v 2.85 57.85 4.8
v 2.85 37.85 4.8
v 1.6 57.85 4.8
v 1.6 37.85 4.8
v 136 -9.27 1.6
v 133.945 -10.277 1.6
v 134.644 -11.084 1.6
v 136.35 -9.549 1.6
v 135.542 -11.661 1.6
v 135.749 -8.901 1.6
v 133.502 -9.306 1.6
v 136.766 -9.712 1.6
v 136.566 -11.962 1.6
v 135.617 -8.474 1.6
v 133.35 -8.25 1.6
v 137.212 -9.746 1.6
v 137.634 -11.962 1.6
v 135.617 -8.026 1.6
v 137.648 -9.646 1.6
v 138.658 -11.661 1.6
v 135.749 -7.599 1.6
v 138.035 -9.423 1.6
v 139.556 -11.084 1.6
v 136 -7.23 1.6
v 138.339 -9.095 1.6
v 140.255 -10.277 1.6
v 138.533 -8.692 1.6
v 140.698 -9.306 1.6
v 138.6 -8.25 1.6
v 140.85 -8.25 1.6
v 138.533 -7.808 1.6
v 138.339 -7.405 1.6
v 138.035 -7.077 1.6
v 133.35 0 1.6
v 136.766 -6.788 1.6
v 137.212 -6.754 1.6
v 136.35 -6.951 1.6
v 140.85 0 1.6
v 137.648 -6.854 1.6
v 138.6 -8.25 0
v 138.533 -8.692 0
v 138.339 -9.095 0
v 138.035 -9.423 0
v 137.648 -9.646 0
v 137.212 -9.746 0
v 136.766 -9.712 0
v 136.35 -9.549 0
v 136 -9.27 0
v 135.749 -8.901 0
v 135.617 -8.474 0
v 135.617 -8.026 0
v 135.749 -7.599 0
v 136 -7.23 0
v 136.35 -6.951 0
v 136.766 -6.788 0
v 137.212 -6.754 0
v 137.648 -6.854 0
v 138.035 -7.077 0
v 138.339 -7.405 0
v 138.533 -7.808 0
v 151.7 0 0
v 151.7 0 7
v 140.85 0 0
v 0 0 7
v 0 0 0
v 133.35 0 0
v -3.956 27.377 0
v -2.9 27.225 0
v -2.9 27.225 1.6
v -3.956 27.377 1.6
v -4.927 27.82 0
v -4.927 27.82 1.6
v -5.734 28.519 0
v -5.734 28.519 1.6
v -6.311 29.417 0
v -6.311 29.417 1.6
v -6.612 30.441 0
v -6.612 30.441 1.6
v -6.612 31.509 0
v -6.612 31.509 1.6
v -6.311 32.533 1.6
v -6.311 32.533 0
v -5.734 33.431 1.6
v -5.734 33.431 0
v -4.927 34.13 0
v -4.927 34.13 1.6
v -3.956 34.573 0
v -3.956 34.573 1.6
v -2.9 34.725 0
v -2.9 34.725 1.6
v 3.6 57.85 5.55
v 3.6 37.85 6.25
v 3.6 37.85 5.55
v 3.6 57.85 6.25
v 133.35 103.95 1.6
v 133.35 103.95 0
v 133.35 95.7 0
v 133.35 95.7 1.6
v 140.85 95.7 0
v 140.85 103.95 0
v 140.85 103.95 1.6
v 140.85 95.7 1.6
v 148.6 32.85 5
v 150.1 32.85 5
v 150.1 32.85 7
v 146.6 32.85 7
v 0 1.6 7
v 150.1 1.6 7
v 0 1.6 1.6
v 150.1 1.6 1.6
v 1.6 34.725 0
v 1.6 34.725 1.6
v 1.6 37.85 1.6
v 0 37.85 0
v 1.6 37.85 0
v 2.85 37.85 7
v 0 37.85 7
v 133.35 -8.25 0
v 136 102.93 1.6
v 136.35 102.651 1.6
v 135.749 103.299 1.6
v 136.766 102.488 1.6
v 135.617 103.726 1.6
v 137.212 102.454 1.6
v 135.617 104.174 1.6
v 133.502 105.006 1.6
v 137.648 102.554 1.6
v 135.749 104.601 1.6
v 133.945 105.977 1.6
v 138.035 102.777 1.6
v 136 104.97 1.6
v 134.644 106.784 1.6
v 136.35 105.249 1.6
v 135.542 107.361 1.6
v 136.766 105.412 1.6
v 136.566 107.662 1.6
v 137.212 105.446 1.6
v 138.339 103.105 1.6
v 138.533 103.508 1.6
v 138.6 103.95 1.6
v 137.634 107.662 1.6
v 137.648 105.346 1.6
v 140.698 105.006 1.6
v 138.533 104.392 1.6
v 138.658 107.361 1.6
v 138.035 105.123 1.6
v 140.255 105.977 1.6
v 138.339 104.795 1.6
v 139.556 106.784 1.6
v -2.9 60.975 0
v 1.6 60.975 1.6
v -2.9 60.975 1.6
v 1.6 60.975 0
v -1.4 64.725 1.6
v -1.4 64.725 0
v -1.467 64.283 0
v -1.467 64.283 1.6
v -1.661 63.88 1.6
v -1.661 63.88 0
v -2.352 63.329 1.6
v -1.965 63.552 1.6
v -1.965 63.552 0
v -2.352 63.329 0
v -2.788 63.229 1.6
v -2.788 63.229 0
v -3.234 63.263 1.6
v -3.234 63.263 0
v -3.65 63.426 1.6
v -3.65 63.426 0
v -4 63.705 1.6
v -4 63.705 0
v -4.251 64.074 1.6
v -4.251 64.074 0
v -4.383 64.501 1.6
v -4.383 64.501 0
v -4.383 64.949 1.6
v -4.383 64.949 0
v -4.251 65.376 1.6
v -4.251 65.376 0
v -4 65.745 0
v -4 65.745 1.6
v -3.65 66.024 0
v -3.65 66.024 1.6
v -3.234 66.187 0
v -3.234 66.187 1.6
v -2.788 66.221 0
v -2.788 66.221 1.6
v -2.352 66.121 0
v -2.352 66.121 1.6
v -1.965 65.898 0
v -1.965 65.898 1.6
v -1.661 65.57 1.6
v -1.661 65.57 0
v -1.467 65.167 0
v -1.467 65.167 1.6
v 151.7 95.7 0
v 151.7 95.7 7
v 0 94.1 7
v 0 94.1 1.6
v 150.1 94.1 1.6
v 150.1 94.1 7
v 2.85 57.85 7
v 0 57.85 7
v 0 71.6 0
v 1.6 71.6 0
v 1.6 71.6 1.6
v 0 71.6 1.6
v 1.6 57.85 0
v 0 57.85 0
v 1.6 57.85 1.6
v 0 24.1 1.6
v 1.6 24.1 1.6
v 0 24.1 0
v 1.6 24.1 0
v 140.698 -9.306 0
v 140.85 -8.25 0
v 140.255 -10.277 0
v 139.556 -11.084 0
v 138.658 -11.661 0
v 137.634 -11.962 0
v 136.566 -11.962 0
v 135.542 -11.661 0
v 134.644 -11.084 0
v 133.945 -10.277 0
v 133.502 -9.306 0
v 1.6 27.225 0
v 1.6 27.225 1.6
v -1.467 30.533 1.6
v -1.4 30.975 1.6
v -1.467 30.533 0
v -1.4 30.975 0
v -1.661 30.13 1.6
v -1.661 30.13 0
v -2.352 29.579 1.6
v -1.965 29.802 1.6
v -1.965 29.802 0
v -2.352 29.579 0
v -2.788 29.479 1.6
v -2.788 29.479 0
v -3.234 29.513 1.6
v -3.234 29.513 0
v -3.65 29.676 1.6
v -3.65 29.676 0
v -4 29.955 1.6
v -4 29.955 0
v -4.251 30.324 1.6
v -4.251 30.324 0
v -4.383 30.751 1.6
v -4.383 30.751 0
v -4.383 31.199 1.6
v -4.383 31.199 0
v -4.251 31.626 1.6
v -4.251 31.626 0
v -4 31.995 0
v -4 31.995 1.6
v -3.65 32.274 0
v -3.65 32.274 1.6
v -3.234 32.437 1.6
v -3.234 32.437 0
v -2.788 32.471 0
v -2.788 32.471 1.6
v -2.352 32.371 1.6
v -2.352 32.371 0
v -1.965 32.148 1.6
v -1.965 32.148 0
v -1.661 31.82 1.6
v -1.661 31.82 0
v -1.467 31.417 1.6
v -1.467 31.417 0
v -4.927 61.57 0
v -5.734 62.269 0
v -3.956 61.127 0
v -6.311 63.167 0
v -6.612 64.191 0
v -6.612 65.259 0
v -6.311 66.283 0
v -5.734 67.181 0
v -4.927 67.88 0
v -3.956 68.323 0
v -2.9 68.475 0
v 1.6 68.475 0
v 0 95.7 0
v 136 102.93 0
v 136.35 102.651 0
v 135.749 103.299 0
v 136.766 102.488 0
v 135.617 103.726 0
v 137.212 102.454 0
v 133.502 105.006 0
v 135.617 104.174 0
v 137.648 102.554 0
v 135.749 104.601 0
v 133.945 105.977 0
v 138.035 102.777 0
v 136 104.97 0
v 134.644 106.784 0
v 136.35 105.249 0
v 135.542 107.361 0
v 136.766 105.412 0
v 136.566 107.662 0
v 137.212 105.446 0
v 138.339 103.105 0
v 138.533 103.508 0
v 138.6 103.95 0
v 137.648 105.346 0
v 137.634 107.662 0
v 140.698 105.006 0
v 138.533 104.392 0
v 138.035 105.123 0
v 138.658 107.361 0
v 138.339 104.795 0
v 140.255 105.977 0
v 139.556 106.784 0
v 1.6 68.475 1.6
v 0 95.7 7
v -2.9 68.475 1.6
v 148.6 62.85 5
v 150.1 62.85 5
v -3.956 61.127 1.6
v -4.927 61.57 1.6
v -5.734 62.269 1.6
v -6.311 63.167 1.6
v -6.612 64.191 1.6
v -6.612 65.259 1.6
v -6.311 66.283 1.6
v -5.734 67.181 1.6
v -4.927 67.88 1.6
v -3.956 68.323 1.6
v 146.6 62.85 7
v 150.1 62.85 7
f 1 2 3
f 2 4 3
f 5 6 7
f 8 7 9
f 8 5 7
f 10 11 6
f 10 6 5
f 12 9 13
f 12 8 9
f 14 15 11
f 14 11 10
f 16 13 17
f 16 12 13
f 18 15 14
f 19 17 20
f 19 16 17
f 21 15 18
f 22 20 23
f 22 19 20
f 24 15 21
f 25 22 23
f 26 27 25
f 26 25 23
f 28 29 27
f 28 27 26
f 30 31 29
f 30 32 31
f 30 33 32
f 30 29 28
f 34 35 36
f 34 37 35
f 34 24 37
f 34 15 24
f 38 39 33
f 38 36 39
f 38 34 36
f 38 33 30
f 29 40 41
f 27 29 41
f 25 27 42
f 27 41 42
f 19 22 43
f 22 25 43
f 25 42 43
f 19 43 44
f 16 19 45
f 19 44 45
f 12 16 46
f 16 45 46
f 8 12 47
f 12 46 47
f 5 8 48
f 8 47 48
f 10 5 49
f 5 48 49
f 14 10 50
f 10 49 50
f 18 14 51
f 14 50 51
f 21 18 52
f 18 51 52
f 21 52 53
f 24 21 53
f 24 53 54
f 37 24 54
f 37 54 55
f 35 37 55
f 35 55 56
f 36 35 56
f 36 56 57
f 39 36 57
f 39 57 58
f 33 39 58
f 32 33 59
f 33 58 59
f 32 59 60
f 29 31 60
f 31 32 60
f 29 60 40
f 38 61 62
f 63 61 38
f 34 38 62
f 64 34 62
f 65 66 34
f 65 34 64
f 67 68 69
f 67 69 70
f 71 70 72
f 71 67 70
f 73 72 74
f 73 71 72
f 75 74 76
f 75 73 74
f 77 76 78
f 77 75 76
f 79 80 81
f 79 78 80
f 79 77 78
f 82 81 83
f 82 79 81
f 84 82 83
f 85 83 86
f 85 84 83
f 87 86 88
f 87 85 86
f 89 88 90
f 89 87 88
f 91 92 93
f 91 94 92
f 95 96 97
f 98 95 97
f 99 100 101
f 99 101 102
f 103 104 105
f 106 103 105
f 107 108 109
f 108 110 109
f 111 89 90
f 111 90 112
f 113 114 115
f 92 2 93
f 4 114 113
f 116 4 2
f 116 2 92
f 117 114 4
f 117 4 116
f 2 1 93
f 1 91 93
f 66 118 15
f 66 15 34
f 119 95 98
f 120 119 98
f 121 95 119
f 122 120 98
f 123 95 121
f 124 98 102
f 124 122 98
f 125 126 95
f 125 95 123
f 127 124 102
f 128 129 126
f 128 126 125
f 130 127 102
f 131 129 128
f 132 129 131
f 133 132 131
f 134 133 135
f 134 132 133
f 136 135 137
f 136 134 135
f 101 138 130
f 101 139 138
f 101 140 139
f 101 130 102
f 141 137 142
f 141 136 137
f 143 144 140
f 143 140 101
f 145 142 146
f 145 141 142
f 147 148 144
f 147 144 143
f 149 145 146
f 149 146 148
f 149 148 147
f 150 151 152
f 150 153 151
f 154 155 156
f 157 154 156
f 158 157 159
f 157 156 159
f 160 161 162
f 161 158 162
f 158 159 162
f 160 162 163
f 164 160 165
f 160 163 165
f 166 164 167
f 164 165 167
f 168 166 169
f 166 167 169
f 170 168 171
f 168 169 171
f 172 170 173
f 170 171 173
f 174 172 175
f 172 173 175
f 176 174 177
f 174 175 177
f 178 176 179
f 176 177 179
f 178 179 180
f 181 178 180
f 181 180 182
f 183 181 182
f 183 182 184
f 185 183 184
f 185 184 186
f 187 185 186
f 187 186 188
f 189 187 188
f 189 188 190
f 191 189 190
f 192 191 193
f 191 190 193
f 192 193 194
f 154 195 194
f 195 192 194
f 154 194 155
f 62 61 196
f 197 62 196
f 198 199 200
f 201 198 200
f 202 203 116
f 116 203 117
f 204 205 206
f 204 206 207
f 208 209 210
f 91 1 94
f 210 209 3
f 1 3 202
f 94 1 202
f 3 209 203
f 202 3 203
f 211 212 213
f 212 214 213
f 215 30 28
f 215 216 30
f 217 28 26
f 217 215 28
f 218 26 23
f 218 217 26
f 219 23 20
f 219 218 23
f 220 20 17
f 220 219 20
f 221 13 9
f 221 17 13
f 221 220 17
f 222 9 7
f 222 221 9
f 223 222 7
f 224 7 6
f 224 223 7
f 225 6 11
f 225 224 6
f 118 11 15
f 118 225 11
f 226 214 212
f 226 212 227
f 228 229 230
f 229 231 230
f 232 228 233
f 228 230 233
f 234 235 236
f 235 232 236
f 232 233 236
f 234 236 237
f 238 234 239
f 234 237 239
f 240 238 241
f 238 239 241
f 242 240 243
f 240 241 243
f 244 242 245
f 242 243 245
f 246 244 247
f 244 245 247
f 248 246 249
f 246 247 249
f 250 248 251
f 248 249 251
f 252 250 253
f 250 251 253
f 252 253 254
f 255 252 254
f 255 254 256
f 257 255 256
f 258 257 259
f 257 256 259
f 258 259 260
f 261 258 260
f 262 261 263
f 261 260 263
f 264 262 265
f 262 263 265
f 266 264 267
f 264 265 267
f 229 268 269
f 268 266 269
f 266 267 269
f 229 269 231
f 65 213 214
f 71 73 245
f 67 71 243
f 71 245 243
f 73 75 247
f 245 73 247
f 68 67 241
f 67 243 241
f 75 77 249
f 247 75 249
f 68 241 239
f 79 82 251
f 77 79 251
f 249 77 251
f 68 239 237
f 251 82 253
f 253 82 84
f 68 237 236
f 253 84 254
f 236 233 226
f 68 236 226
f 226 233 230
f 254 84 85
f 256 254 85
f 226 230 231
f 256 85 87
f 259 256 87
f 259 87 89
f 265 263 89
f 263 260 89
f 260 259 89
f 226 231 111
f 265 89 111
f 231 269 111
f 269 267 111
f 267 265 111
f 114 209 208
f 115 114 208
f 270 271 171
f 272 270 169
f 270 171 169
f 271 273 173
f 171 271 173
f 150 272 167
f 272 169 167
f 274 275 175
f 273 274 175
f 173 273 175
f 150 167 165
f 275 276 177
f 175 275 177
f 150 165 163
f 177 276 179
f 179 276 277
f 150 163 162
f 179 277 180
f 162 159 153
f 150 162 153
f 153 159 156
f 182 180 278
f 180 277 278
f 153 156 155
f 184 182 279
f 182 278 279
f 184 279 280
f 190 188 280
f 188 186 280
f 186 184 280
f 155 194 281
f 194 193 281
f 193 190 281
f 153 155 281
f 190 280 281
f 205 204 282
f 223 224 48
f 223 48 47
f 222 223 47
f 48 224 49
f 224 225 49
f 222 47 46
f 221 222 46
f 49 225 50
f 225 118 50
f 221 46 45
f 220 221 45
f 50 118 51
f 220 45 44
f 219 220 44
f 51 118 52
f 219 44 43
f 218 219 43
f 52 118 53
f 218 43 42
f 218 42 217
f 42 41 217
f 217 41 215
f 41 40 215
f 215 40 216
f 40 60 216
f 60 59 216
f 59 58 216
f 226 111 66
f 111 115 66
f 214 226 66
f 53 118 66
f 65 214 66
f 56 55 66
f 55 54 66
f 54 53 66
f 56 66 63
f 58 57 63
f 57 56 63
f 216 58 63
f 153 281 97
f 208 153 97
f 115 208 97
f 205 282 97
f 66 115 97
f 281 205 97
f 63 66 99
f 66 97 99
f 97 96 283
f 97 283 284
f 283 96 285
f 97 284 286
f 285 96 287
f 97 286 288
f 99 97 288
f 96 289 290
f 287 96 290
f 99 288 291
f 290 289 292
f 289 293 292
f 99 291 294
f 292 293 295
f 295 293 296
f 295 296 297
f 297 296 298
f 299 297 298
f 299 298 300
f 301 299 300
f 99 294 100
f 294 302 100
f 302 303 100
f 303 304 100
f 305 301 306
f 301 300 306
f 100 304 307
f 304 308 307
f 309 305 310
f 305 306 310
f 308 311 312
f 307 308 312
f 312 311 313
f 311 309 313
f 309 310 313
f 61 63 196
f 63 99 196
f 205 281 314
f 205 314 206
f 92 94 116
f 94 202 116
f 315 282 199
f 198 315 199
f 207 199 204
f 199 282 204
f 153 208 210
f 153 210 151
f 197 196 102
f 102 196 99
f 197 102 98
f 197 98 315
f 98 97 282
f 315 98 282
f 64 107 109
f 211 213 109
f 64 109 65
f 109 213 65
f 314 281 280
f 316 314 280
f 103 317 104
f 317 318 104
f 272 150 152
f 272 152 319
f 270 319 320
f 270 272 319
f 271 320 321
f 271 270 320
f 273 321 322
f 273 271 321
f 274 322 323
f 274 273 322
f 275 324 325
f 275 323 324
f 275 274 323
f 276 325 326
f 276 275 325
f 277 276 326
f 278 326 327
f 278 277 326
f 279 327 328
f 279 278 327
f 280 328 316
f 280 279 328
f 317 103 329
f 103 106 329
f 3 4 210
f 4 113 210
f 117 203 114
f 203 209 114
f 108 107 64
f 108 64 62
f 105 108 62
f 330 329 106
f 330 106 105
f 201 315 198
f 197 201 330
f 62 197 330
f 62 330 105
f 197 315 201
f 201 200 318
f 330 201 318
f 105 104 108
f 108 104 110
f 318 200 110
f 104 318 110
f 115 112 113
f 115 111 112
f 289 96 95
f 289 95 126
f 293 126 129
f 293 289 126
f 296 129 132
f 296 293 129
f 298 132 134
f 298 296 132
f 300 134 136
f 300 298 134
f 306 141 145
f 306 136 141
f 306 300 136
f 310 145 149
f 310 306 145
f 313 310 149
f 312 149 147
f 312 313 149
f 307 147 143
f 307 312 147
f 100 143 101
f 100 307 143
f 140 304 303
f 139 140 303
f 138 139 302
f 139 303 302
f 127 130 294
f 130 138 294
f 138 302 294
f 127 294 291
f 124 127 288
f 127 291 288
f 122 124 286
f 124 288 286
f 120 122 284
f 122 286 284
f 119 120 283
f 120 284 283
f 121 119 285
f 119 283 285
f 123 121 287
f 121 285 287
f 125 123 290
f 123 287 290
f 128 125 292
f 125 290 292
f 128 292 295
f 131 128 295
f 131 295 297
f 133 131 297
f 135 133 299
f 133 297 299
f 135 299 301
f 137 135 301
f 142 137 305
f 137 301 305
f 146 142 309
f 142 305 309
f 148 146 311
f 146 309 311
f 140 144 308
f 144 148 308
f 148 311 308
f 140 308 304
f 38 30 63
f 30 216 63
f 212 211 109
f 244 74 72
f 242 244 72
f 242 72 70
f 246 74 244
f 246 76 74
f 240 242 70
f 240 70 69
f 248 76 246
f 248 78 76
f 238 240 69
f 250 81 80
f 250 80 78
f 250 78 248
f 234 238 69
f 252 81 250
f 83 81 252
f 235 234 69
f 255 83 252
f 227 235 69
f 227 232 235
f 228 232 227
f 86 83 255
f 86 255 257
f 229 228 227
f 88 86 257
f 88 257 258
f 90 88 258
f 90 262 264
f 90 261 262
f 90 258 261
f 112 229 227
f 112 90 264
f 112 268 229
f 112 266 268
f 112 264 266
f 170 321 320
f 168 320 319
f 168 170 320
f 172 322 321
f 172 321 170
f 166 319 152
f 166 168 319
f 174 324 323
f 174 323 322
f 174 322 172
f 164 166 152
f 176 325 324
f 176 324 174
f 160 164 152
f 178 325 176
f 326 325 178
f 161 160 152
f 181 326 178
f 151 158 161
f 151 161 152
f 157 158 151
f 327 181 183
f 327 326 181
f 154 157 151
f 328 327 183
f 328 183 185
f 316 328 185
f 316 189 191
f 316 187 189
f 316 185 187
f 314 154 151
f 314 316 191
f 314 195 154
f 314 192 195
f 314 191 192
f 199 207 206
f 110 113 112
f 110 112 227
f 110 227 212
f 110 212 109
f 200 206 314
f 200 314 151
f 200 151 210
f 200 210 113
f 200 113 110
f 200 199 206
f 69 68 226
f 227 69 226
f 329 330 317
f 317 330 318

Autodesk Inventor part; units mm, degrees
ref_plane "YZ Plane" through (0, 0, 0) normal (1, 0, 0) x (0, 1, 0)
ref_plane "XZ Plane" through (0, 0, 0) normal (0, 1, 0) x (-1, 0, 0)
ref_plane "XY Plane" through (0, 0, 0) normal (0, 0, 1) x (1, 0, 0)
sketch "Sketch1" plane through (0, 0, 0) normal (0, 0, 1) x (1, 0, 0)
  line L0 (150.1, 1.6) -> (0, 1.6)
  line L1 (1.6, 24.1) -> (1.6, 71.6)
  line L2 (1.6, 24.1) -> (0, 24.1)
  line L3 (1.6, 47.85) -> (150.1, 47.85) construction
  line L4 (1.6, 71.6) -> (0, 71.6)
  line L5 (0, 71.6) -> (0, 94.1)
  line L6 (1.6, 30.975) -> (-2.9, 30.975) construction
  circle A0 centre (-2.9, 30.975) radius 1.5
  line L7 (-2.9, 27.225) -> (-2.9, 34.725) construction
  line L8 (-2.9, 27.225) -> (1.6, 27.225)
  line L9 (-2.9, 34.725) -> (1.6, 34.725)
  line L10 (1.6, 57.85) -> (0, 57.85)
  line L11 (0, 57.85) -> (0, 37.85)
  line L12 (0, 37.85) -> (1.6, 37.85)
  line L13 (0, 57.85) -> (0, 68.475) construction
  line L14 (0, 37.85) -> (0, 27.225) construction
  line L15 (0, 24.1) -> (0, 34.725) construction
  line L16 (151.7, 0) -> (0, 0)
  line L17 (151.7, 95.7) -> (0, 95.7)
  line L18 (0, 95.7) -> (0, 94.1)
  line L19 (0, 94.1) -> (150.1, 94.1)
  line L20 (137.1, 94.1) -> (137.1, 103.95) construction
  circle A1 centre (137.1, 103.95) radius 1.5
  arc A2 (140.85, 103.95) -> (133.35, 103.95) centre (137.1, 103.95) ccw
  line L21 (133.35, 103.95) -> (140.85, 103.95) construction
  line L22 (140.85, 103.95) -> (140.85, 95.7)
  line L23 (133.35, 103.95) -> (133.35, 95.7)
  line L24 (137.1, 1.6) -> (137.1, -8.25) construction
  circle A3 centre (137.1, -8.25) radius 1.5
  arc A4 (133.35, -8.25) -> (140.85, -8.25) centre (137.1, -8.25) ccw
  line L25 (133.35, -8.25) -> (140.85, -8.25) construction
  line L26 (140.85, -8.25) -> (140.85, 0)
  line L27 (133.35, -8.25) -> (133.35, 0)
  arc A5 (-2.9, 34.725) -> (-2.9, 27.225) centre (-2.9, 30.975) ccw
  line L28 (150.1, 94.1) -> (150.1, 1.6)
  line L29 (151.7, 0) -> (151.7, 95.7)
  line L30 (0, 24.1) -> (0, 0)
  line L31 (1.6, 64.725) -> (-2.9, 64.725) construction
  circle A6 centre (-2.9, 64.725) radius 1.5
  line L32 (-2.9, 68.475) -> (-2.9, 60.975) construction
  line L33 (1.6, 68.475) -> (-2.9, 68.475)
  line L34 (1.6, 60.975) -> (-2.9, 60.975)
  arc A7 (-2.9, 68.475) -> (-2.9, 60.975) centre (-2.9, 64.725) ccw
  point P0 (0, 0)
  dimension "d8" = 3
  dimension "d9" = 4.5
  dimension "d11" = 1.6
  dimension "d14" = 3
  dimension "d15" = 7.5
  dimension "d17" = 7.5
  dimension "d19" = 112.2
  dimension "d23" = 1.6
  dimension "d27" = 22.5
  dimension "d28" = 1.6
  dimension "d29" = 1.6
  dimension "d30" = 148.5
  dimension "d31" = 92.5
  dimension "d32" = 1.6
  dimension "d34" = 140
  dimension "d36" = 33.75
  dimension "d37" = 7.5
extrude "Extrusion1" add sketch "Sketch1" along normal blind 1.6
extrude "Extrusion2" add sketch "Sketch1" along normal blind 7 contours L28 L19 L18 L17 L29 L16 L30 L0 | L12 L11 L10 L1
sketch "Sketch2" plane through (150.1, 1.6, 1.6) normal (-1, 0, 0) x (0, 0, 1)
  line L0 (-1.6, -1.6) -> (-1.6, 94.1) projected
  line L1 (-1.6, 94.1) -> (5.4, 94.1) projected
  line L2 (5.4, -1.6) -> (5.4, 94.1) projected
  line L3 (-1.6, -1.6) -> (5.4, -1.6) projected
  line L4 (0, 56.25) -> (0, 36.25) projected
  line L5 (0, 36.25) -> (0, 33.125) projected
  line L6 (0, 33.125) -> (0, 25.625) projected
  line L7 (0, 25.625) -> (0, 22.5) projected
  line L8 (0, 22.5) -> (0, 0) projected
  line L9 (0, 0) -> (0, 92.5) projected
  line L10 (0, 92.5) -> (0, 70) projected
  line L11 (0, 70) -> (0, 66.875) projected
  line L12 (0, 66.875) -> (0, 59.375) projected
  line L13 (0, 59.375) -> (0, 56.25) projected
  line L14 (0, 64.625) -> (0, 61.625) projected
  line L15 (0, 30.875) -> (0, 27.875) projected
  line L16 (5.4, -1.6) -> (5.4, 94.1) projected
  line L17 (5.4, 61.25) -> (3.4, 61.25)
  line L18 (3.4, 61.25) -> (3.4, 31.25)
  line L19 (3.4, 31.25) -> (5.4, 31.25)
  line L20 (5.4, 31.25) -> (5.4, 61.25)
  line L21 (-1.6, -1.6) -> (-1.6, 94.1) projected
  line L22 (5.4, 46.25) -> (-1.6, 46.25) construction
  dimension "d42" = 2
  dimension "d43" = 30
extrude "Extrusion3" add sketch "Sketch2" along normal blind 3.5 contours L19 L18 L17 L2
chamfer "Chamfer1" distance 2 angle 45 1 edges at (146.6, 47.85, 5)
sketch "Sketch3" plane through (1.6, 37.85, 1.6) normal (1, 0, 0) x (0, 0, -1)
  line L0 (1.6, 20) -> (1.6, 0) projected
  line L1 (1.6, 0) -> (-5.4, 0) projected
  line L2 (-5.4, 20) -> (-5.4, 0) projected
  line L3 (1.6, 20) -> (-5.4, 20) projected
  line L4 (1.6, 0) -> (-5.4, 0) projected
  line L5 (1.6, 20) -> (-5.4, 20) projected
  line L6 (-5.4, 0) -> (-3.2, 0)
  line L7 (-3.2, 0) -> (-3.2, 20)
  line L8 (-3.2, 20) -> (-5.4, 20)
  line L9 (-5.4, 20) -> (-5.4, 0)
  point P0 (1.6, -37.85)
  dimension "d49" = 2.2
extrude "Extrusion4" add sketch "Sketch3" along normal blind 2 contours L7 L1 L2 L3
chamfer "Chamfer2" distance 0.75 angle 45 2 edges at (3.6, 47.85, 7) (3.6, 47.85, 4.8)
properties part number "PCB_deck"
